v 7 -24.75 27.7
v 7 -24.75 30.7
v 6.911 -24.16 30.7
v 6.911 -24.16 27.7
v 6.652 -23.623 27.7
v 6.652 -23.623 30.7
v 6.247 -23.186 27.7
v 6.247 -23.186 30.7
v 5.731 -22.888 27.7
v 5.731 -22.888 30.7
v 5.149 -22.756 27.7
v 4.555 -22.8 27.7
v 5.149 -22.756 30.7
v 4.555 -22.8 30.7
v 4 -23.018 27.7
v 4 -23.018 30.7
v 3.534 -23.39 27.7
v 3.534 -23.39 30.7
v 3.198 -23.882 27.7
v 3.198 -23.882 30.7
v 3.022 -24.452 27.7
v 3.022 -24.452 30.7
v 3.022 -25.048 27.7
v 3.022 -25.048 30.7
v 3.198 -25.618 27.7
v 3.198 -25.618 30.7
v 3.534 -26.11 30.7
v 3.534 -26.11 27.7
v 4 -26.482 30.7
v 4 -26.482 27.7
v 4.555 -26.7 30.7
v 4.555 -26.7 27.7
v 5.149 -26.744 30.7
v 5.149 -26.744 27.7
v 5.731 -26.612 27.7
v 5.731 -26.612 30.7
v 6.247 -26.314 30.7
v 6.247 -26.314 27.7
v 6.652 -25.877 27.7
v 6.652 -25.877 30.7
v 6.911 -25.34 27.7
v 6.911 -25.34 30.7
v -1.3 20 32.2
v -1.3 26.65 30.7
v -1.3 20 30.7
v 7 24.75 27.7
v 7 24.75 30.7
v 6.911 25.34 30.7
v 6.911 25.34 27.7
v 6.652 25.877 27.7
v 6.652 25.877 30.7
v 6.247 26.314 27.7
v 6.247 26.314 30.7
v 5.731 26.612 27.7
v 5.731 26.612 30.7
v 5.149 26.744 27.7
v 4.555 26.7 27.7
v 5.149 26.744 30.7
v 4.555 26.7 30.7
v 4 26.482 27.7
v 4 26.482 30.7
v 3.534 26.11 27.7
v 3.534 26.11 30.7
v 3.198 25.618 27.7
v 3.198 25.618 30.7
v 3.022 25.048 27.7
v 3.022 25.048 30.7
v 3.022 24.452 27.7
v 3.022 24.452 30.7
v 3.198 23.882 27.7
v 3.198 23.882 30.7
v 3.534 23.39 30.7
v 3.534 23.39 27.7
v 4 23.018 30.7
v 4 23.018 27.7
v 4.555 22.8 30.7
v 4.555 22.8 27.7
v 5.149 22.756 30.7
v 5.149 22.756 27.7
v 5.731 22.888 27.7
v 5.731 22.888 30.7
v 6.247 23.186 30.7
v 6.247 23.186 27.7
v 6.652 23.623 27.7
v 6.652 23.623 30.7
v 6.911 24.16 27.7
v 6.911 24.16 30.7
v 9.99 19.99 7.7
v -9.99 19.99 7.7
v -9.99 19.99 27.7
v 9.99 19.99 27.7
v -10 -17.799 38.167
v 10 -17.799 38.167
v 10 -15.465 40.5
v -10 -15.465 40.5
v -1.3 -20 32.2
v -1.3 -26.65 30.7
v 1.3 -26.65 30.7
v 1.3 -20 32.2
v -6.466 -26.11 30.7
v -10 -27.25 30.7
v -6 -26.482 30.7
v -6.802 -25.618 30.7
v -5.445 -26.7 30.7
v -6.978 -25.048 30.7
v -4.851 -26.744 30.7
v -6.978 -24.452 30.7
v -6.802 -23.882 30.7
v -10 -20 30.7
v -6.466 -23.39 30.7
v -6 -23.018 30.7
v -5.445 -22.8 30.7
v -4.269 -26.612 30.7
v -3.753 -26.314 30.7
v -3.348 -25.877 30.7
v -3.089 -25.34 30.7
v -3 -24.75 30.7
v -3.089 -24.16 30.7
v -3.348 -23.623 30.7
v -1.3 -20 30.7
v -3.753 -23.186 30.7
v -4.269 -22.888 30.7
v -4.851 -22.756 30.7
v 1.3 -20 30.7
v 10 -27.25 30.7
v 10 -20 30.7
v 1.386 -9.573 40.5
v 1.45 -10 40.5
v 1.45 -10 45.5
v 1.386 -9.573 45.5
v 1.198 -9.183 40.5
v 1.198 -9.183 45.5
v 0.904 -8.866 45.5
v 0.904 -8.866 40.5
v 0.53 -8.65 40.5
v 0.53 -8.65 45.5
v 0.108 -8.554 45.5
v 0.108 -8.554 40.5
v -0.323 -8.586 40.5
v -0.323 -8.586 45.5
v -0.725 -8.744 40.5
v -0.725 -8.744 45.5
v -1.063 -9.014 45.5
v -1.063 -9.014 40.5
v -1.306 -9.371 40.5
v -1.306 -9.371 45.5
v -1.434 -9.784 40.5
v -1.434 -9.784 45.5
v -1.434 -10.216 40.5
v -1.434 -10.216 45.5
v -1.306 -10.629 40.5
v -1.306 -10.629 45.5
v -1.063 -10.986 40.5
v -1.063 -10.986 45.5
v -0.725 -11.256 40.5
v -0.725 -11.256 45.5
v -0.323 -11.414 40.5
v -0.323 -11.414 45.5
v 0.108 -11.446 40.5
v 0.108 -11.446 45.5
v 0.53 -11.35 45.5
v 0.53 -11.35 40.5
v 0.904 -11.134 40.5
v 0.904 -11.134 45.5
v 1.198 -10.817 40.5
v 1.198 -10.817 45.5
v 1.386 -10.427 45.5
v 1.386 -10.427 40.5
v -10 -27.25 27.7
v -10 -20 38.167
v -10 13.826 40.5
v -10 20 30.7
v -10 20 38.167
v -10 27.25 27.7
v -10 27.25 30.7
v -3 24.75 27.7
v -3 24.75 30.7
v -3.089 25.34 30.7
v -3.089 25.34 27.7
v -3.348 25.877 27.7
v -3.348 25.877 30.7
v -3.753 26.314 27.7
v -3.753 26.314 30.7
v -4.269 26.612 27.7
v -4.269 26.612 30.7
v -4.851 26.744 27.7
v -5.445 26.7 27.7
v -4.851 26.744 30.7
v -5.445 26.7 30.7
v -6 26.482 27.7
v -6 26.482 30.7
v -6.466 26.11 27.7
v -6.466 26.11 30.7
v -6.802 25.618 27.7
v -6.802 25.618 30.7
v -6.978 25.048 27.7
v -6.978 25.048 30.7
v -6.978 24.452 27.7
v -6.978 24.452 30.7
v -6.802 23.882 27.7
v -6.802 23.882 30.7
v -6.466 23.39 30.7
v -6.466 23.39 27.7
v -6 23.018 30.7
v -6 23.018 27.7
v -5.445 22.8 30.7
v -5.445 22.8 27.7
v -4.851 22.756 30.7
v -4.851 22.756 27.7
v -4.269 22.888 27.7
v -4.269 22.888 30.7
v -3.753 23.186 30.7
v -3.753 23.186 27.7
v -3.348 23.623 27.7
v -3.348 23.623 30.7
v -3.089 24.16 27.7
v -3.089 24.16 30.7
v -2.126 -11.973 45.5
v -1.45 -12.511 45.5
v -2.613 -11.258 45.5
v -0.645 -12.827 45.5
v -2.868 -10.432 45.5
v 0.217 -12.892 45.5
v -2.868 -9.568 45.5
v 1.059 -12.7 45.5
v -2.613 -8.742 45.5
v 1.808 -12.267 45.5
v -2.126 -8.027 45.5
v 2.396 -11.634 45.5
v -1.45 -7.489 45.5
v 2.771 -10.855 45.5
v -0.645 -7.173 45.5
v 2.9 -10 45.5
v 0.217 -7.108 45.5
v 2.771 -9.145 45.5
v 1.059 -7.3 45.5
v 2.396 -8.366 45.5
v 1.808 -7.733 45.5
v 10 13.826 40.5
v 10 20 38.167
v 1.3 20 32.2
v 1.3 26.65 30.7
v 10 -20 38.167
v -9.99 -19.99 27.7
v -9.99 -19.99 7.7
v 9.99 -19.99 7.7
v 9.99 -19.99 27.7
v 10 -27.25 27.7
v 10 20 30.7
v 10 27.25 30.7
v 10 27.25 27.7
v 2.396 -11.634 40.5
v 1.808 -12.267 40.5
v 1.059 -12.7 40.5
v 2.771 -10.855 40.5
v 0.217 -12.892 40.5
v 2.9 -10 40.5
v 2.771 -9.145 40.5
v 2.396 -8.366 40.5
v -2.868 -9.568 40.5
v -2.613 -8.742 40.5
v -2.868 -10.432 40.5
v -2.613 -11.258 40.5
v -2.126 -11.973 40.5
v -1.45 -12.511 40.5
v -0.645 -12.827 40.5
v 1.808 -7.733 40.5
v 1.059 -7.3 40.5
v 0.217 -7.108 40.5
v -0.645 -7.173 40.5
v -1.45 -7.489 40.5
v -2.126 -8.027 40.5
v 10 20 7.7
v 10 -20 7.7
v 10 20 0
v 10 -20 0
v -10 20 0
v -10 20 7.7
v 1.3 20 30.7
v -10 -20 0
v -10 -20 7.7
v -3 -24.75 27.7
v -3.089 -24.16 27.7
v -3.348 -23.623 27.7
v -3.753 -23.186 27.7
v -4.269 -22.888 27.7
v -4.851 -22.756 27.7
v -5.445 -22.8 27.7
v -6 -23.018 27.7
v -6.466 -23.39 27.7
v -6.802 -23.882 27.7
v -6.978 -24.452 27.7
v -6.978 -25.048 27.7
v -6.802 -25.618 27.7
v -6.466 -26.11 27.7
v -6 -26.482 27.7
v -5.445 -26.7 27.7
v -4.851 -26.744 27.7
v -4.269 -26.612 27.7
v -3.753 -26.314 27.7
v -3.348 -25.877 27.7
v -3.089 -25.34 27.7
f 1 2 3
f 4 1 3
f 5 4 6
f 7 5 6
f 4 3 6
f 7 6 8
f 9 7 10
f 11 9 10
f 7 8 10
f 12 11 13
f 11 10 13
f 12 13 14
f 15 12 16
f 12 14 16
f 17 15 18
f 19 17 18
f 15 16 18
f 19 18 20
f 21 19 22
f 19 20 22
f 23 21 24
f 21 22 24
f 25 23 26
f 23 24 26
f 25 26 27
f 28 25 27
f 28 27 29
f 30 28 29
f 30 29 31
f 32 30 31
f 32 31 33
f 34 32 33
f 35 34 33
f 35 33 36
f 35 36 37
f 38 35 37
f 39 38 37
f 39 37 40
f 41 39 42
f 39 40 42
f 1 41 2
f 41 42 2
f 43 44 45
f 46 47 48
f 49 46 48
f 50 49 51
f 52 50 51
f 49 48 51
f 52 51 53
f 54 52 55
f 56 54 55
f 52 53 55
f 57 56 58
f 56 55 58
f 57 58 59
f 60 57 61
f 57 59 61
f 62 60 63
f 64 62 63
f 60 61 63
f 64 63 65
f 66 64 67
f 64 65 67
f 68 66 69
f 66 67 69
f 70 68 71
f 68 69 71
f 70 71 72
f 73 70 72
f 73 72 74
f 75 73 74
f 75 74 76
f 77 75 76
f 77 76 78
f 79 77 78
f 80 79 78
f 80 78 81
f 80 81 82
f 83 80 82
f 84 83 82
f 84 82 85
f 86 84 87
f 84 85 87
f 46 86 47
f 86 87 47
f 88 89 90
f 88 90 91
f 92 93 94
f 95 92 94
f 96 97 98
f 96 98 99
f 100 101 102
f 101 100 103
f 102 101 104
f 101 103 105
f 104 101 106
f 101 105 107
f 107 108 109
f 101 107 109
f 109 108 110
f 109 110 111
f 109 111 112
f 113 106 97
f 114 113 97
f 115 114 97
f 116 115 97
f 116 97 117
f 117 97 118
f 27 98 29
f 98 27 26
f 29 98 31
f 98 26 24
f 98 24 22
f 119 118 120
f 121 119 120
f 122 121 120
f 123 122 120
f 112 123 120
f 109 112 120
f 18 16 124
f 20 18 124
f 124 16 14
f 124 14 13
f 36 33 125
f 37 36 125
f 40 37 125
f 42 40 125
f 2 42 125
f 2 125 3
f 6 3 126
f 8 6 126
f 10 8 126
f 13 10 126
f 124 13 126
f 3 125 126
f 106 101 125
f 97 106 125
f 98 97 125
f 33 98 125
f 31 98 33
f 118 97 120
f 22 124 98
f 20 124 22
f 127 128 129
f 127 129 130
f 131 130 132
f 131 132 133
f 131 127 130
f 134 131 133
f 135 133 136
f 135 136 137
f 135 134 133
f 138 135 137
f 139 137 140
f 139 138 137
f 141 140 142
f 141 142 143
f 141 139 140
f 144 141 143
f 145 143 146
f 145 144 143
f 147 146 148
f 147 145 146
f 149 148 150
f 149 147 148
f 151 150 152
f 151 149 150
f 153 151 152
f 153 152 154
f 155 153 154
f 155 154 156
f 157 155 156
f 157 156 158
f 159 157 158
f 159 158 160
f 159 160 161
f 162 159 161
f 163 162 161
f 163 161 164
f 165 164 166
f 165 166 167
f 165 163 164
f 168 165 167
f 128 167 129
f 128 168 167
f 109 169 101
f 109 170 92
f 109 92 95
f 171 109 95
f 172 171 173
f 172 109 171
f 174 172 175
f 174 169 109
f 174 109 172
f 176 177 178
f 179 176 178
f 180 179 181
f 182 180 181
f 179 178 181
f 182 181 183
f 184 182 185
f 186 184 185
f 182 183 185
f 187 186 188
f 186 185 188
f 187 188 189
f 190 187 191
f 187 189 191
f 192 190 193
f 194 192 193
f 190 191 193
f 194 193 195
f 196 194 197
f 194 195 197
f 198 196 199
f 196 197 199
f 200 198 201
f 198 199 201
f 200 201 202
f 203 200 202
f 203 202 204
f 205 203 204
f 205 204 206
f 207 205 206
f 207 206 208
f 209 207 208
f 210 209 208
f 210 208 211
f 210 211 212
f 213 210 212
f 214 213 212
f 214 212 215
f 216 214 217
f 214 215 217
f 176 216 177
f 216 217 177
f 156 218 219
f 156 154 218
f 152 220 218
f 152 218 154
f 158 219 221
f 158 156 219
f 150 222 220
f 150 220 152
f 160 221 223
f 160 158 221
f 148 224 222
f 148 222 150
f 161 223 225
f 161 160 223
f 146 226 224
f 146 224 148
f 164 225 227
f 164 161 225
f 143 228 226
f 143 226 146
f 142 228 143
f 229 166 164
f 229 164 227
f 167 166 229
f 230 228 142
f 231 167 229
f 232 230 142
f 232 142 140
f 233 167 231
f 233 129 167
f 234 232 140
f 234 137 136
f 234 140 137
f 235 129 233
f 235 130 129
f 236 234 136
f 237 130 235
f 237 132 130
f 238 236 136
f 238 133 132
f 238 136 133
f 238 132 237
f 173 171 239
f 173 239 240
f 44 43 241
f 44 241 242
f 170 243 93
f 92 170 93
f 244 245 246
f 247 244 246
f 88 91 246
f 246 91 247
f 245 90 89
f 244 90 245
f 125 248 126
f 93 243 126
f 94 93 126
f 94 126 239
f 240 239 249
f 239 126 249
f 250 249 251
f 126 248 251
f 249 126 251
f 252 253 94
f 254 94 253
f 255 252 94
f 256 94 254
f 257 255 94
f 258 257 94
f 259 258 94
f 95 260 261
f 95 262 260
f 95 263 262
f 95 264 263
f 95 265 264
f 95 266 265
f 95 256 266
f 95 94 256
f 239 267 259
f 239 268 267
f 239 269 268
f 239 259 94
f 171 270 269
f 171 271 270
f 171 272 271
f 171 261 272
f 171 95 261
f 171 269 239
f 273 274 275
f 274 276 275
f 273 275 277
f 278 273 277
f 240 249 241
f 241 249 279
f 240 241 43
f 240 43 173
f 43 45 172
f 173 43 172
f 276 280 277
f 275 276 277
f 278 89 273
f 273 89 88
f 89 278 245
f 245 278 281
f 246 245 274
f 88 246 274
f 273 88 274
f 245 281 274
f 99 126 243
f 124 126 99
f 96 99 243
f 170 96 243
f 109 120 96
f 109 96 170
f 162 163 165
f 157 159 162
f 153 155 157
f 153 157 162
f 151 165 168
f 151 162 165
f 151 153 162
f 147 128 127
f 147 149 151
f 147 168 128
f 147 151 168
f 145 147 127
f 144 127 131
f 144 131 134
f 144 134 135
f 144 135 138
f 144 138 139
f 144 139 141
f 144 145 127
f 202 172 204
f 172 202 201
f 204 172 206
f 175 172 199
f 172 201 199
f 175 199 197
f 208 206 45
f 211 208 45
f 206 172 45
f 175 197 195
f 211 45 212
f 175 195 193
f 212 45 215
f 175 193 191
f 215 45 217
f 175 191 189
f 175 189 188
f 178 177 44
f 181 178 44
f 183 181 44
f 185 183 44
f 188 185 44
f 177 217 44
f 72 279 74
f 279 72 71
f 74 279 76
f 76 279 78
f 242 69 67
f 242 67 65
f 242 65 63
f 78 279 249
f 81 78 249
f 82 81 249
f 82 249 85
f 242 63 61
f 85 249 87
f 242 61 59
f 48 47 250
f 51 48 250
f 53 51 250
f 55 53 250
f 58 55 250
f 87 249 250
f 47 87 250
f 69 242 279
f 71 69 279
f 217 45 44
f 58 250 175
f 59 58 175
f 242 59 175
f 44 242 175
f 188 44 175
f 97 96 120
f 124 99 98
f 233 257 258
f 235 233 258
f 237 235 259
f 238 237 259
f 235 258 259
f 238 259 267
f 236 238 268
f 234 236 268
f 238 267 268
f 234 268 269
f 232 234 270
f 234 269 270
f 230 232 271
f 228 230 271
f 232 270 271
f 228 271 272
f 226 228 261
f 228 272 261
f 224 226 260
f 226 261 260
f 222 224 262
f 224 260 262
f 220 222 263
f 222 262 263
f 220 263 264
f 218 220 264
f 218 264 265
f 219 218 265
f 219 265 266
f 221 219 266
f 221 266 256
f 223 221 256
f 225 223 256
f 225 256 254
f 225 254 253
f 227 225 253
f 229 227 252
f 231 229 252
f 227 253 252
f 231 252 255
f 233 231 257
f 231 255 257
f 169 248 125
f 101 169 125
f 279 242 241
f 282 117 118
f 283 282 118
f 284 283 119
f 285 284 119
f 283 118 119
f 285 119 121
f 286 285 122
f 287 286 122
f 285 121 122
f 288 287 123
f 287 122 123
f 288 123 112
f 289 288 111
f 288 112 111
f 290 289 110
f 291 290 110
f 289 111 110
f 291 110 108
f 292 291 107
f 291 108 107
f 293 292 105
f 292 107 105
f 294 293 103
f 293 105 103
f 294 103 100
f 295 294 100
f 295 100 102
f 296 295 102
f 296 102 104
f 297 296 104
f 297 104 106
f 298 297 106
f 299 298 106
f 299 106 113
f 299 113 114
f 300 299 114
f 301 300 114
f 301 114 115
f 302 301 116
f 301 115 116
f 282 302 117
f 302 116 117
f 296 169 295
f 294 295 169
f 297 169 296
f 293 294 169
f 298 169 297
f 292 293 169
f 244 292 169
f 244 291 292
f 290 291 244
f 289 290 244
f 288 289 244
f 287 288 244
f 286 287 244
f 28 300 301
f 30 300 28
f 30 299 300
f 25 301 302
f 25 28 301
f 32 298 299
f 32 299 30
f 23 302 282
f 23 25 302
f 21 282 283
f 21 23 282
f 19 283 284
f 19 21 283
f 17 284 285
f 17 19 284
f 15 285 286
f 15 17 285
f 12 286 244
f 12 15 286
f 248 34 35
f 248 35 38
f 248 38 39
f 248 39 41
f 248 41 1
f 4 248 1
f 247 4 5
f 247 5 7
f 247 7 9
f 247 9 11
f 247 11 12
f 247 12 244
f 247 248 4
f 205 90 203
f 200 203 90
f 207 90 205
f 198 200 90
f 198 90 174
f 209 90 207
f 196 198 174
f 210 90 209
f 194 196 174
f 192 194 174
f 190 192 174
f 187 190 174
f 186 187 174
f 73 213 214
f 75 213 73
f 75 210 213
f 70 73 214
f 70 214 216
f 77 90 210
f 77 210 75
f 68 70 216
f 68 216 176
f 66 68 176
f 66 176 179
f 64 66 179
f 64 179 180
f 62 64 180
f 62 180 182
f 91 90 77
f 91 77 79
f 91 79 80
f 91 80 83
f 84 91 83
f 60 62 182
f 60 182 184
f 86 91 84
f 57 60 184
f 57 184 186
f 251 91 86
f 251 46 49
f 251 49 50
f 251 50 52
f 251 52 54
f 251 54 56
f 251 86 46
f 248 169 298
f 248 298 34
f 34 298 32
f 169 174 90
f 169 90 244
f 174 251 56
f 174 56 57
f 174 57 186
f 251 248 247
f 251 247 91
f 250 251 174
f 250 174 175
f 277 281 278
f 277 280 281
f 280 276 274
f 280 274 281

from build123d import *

# Parameters (mm, degrees)
SKETCH1_W                = 40
SKETCH1_H                = 20
BOSS_EXTRUDE1_DEPTH      = 40.5
SKETCH2_W                = 7.25
SKETCH2_H                = 3
BOSS_EXTRUDE2_DEPTH      = 20
SKETCH3_R                = 2
CUT_EXTRUDE1_DEPTH       = 3
SKETCH4_R                = 2.9
SKETCH4_R_2              = 1.45
BOSS_EXTRUDE3_DEPTH      = 5
CUT_EXTRUDE2_DEPTH       = 20
SKETCH5_W                = 20
SKETCH5_H                = 40
SKETCH5_W_2              = 19.98
SKETCH5_H_2              = 39.98
CUT_EXTRUDE3_DEPTH       = 20
BOSS_EXTRUDE5_DEPTH      = 1.3
BOSS_EXTRUDE5_DEPTH_BACK = 1.3


with BuildPart() as part:
    # Sketch1 → Boss-Extrude1 (new body)
    with BuildSketch(Plane(origin=(0, 0, 0), x_dir=(0, 1, 0), z_dir=(0, 0, 1))):
        Rectangle(SKETCH1_W, SKETCH1_H)
    extrude(amount=BOSS_EXTRUDE1_DEPTH)

    # Sketch2 → Boss-Extrude2 (add)
    with BuildSketch(Plane.YZ.offset(10)):
        with Locations((-23.625, 29.2)):
            Rectangle(SKETCH2_W, SKETCH2_H)
        with Locations((23.625, 29.2)):
            Rectangle(SKETCH2_W, SKETCH2_H)
        Polygon((20, 38.166547622), (13.826265312, 40.5), (20, 40.5), align=None)
        Polygon((-20, 38.166547622), (-17.798587441, 38.166547622), (-15.465135063, 40.5), (-20, 40.5), align=None)
    extrude(amount=-BOSS_EXTRUDE2_DEPTH)

    # Sketch3 → Cut-Extrude1 (cut)
    with BuildSketch(Plane.XY.offset(30.7)):
        with Locations((-5, 24.75)):
            Circle(SKETCH3_R)
        with Locations((5, 24.75)):
            Circle(SKETCH3_R)
        with Locations((-5, -24.75)):
            Circle(SKETCH3_R)
        with Locations((5, -24.75)):
            Circle(SKETCH3_R)
    extrude(amount=-CUT_EXTRUDE1_DEPTH, mode=Mode.SUBTRACT)

    # Sketch4 → Boss-Extrude3 (add)
    with BuildSketch(Plane.XY.offset(40.5)):
        with Locations((0, -10)):
            Circle(SKETCH4_R)
        with Locations((0, -10)):
            Circle(SKETCH4_R_2, mode=Mode.SUBTRACT)
    extrude(amount=BOSS_EXTRUDE3_DEPTH)

    # Sketch2<2> → Cut-Extrude2 (cut)
    with BuildSketch(Plane.YZ.offset(10)):
        Polygon((-20, 40.5), (-20, 38.166547622), (-17.798587441, 38.166547622), (-15.465135063, 40.5), align=None)
        Polygon((20, 40.5), (13.826265312, 40.5), (20, 38.166547622), align=None)
    extrude(amount=-CUT_EXTRUDE2_DEPTH, mode=Mode.SUBTRACT)

    # Sketch5 → Cut-Extrude3 (cut)
    with BuildSketch(Plane(origin=(0, 0, 27.7), x_dir=(1, 0, 0), z_dir=(0, 0, -1))):
        Rectangle(SKETCH5_W, SKETCH5_H)
        Rectangle(SKETCH5_W_2, SKETCH5_H_2, mode=Mode.SUBTRACT)
    extrude(amount=CUT_EXTRUDE3_DEPTH, mode=Mode.SUBTRACT)

    # Sketch6 → Boss-Extrude5 (add, two sides: drawn at the far end of the back side and taken through both)
    with BuildSketch(Plane.YZ.offset(-BOSS_EXTRUDE5_DEPTH_BACK)):
        Polygon((-26.65, 30.7), (-20, 32.2), (-20, 30.7), align=None)
        Polygon((20, 32.2), (26.65, 30.7), (20, 30.7), align=None)
    extrude(amount=BOSS_EXTRUDE5_DEPTH + BOSS_EXTRUDE5_DEPTH_BACK)


solid = part.part
